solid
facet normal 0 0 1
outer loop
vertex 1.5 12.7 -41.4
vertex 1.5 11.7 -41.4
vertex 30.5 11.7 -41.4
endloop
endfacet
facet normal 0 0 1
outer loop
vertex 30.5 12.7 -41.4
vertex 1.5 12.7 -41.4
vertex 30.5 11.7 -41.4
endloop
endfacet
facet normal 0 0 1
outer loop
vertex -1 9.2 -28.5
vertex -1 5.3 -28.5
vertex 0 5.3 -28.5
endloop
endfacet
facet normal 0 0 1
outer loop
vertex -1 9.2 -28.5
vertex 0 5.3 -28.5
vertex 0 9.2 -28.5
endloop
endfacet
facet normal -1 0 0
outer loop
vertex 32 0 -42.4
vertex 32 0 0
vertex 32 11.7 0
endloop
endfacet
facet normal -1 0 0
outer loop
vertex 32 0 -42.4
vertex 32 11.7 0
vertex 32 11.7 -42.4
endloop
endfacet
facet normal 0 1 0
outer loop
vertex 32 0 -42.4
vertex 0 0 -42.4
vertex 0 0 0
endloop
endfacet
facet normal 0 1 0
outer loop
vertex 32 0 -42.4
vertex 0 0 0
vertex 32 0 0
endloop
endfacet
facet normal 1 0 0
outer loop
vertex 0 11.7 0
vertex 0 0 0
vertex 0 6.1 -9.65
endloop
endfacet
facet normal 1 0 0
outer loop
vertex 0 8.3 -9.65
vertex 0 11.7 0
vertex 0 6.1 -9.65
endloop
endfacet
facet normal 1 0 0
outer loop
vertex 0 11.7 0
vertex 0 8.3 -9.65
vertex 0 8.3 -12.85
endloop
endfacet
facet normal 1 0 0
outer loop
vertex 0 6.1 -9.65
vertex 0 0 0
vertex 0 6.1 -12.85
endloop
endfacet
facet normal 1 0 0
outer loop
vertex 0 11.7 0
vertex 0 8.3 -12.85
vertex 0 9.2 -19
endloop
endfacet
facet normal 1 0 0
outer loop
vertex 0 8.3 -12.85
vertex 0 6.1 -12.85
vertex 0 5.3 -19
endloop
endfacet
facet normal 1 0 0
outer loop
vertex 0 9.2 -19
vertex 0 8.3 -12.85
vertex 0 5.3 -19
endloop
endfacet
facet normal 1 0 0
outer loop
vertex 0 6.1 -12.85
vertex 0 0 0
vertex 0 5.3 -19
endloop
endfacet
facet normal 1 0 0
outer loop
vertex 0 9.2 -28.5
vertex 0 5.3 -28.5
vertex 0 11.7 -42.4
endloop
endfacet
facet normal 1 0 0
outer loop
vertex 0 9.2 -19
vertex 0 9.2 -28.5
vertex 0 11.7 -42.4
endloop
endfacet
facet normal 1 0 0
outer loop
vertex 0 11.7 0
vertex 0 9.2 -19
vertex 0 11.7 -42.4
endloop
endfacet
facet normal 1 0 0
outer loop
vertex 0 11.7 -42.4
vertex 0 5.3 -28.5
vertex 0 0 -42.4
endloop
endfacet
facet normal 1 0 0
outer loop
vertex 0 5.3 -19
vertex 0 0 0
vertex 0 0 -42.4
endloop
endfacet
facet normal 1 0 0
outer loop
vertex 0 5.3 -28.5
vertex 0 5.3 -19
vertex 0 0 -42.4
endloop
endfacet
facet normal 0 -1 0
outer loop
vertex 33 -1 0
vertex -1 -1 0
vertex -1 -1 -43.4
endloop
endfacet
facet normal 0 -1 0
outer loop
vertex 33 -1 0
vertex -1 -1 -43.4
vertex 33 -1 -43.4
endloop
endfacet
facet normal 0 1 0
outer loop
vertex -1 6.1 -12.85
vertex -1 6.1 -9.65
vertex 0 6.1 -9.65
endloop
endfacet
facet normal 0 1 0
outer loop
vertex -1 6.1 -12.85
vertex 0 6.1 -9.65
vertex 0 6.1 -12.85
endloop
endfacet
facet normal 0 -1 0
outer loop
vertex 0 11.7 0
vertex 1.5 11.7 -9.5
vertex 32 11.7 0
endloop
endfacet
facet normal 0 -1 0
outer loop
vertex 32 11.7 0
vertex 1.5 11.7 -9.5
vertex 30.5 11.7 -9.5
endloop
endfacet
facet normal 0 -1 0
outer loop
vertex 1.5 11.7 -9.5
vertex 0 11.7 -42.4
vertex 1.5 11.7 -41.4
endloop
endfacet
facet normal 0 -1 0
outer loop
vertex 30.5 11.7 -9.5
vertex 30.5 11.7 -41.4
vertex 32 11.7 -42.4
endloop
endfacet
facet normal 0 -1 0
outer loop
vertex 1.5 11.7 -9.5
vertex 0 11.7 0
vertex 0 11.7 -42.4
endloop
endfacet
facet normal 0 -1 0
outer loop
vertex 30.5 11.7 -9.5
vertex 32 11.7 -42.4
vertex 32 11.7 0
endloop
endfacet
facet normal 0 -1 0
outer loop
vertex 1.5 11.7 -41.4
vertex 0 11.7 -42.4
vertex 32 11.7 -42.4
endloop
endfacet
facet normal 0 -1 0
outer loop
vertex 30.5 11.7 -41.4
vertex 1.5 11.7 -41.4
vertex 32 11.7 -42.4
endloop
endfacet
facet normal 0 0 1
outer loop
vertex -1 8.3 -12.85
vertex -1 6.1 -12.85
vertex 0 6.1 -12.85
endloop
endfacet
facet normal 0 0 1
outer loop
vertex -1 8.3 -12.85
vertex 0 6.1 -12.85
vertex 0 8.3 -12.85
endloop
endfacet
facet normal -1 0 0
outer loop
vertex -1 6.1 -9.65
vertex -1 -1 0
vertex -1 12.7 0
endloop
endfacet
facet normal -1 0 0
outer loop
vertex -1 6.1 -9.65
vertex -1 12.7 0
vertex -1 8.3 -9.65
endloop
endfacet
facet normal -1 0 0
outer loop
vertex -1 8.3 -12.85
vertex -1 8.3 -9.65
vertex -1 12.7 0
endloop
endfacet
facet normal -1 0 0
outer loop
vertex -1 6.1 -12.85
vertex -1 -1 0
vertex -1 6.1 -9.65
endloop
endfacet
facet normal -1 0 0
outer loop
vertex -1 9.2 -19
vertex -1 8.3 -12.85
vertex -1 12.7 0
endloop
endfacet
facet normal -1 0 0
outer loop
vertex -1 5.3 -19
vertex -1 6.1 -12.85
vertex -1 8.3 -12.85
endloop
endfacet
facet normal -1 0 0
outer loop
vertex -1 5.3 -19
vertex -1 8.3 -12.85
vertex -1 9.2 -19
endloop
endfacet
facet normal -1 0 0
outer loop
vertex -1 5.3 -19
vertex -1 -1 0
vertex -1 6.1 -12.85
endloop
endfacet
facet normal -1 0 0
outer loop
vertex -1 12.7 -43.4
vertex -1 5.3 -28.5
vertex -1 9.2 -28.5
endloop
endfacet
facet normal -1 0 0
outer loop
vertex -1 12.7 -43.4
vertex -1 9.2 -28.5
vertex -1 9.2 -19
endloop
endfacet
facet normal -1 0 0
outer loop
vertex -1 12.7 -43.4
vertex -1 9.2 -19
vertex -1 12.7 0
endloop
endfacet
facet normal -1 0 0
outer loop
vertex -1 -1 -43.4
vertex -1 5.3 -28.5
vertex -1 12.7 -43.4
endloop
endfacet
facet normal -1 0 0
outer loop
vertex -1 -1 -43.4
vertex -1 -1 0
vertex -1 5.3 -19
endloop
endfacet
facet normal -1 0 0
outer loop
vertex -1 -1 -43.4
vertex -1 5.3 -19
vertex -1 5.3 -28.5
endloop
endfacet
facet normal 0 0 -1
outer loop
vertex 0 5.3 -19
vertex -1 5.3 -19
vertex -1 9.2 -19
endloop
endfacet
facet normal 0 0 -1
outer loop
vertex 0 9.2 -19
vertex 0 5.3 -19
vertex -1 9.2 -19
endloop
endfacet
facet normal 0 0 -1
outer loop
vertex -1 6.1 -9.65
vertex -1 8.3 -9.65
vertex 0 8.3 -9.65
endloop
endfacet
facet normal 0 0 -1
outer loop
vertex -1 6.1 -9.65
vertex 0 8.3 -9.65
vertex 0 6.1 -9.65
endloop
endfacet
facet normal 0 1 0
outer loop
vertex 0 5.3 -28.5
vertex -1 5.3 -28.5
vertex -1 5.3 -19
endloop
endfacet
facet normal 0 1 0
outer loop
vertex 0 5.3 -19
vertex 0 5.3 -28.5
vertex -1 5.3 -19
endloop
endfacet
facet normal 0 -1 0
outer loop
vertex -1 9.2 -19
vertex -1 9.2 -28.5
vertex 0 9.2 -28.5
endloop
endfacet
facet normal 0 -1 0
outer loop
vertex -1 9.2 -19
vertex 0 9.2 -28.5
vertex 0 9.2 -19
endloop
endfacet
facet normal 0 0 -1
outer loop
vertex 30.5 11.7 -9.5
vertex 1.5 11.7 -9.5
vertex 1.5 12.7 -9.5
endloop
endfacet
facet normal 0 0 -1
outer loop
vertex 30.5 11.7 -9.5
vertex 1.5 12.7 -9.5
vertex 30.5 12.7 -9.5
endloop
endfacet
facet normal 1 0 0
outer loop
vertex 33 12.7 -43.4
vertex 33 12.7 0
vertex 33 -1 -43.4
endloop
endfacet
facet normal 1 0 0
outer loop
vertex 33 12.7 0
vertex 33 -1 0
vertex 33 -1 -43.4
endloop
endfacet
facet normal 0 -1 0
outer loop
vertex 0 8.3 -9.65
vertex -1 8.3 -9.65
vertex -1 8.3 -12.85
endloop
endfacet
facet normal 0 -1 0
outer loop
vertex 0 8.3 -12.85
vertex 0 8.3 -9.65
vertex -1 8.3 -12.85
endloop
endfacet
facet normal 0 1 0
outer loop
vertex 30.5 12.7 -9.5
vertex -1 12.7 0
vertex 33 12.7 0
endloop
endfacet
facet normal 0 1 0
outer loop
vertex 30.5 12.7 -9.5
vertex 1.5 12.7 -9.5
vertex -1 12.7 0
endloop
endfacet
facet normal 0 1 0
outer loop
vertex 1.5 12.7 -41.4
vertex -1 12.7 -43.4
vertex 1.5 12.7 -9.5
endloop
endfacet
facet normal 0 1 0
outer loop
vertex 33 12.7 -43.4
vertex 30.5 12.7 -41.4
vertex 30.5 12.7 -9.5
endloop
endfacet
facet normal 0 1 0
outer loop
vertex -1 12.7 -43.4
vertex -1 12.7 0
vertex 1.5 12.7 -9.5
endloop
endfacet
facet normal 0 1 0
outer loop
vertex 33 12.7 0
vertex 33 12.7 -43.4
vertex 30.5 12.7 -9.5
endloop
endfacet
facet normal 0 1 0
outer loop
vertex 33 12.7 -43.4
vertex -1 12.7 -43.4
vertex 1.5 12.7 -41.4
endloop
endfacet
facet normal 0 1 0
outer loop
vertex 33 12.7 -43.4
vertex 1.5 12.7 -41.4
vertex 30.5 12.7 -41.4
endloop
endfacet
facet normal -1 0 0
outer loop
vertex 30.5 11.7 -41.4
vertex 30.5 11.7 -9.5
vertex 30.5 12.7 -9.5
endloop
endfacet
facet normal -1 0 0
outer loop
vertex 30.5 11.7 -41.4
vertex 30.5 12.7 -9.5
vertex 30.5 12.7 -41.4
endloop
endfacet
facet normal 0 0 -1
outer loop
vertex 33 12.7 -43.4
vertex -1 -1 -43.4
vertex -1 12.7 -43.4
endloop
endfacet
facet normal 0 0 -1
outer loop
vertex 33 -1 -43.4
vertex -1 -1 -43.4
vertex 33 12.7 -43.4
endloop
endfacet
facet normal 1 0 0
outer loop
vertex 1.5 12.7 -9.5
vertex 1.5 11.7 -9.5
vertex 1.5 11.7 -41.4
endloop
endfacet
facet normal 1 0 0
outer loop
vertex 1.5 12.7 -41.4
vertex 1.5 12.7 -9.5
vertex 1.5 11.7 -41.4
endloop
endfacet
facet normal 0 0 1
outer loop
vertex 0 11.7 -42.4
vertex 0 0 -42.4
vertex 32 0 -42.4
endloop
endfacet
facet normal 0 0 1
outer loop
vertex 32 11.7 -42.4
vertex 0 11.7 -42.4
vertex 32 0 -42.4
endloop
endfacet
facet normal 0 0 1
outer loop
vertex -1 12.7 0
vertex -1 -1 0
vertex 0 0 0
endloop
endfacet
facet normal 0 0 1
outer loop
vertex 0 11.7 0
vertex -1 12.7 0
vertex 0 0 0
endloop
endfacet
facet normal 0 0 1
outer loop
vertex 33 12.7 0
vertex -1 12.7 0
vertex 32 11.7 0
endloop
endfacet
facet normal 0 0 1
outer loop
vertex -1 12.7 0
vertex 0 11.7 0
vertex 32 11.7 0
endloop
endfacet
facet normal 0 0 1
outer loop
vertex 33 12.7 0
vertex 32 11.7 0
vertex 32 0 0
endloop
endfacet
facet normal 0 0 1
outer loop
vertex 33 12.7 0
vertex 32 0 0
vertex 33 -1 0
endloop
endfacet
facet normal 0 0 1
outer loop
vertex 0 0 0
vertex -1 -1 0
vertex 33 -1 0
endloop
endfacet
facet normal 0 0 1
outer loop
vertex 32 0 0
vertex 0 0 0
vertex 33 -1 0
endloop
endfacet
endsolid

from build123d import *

# Parameters (mm, degrees)
SKETCH_1_W            = 32
SKETCH_1_H            = 42.4
EXTRUDE_1_DEPTH       = 11.7
SHELL_1_T             = 1
CUT_EXTRUDE_664_REACH = 58.36
SKETCH_2_W            = 9.5
SKETCH_2_H            = 3.9
SKETCH_4_W            = 34
SKETCH_4_H            = 43.4
SKETCH_4_W_2          = 29
SKETCH_4_H_2          = 31.9
EXTRUDE_2_DEPTH       = 1


with BuildPart() as part:
    # 草图1 → 凸台-拉伸1 (new body)
    with BuildSketch(Plane(origin=(0, 0, 0), x_dir=(1, 0, 0), z_dir=(0, 1, 0))):
        with Locations((16, 21.2)):
            Rectangle(SKETCH_1_W, SKETCH_1_H)
    extrude(amount=EXTRUDE_1_DEPTH)

    # 抽壳1
    shell_1_openings = [part.faces().sort_by_distance(p)[0] for p in [
        (16, 5.85, 0),
        (16, 11.7, -21.2),
    ]]
    offset(amount=SHELL_1_T, openings=shell_1_openings, kind=Kind.INTERSECTION)

    # 草图2 → Cut-Extrude 664 (cut, up to next)
    with BuildSketch(Plane.ZY.offset(1), mode=Mode.PRIVATE) as cut_extrude_664_sk1:
        with Locations((-23.75, 7.25)):
            Rectangle(SKETCH_2_W, SKETCH_2_H)
    cut_extrude_664_tool1 = extrude(cut_extrude_664_sk1.sketch, amount=-CUT_EXTRUDE_664_REACH, mode=Mode.PRIVATE) & part.part
    # 草图2 → Cut-Extrude 664 (cut, up to next)
    with BuildSketch(Plane.ZY.offset(1), mode=Mode.PRIVATE) as cut_extrude_664_sk2:
        Polygon((-11.25, 8.3), (-9.65, 8.3), (-9.65, 6.1), (-12.85, 6.1), (-12.85, 8.3), align=None)
    cut_extrude_664_tool2 = extrude(cut_extrude_664_sk2.sketch, amount=-CUT_EXTRUDE_664_REACH, mode=Mode.PRIVATE) & part.part
    add(cut_extrude_664_tool1.solids().sort_by_distance((-1, 7.25, -23.75))[0], mode=Mode.SUBTRACT)
    add(cut_extrude_664_tool2.solids().sort_by_distance((-1, 7.2, -11.25))[0], mode=Mode.SUBTRACT)

    # 草图4 → 凸台-拉伸2 (add)
    with BuildSketch(Plane(origin=(0, 11.7, 0), x_dir=(1, 0, 0), z_dir=(0, 1, 0))):
        with Locations((16, 21.7)):
            Rectangle(SKETCH_4_W, SKETCH_4_H)
        with Locations((16, 25.45)):
            Rectangle(SKETCH_4_W_2, SKETCH_4_H_2, mode=Mode.SUBTRACT)
    extrude(amount=EXTRUDE_2_DEPTH)


solid = part.part
